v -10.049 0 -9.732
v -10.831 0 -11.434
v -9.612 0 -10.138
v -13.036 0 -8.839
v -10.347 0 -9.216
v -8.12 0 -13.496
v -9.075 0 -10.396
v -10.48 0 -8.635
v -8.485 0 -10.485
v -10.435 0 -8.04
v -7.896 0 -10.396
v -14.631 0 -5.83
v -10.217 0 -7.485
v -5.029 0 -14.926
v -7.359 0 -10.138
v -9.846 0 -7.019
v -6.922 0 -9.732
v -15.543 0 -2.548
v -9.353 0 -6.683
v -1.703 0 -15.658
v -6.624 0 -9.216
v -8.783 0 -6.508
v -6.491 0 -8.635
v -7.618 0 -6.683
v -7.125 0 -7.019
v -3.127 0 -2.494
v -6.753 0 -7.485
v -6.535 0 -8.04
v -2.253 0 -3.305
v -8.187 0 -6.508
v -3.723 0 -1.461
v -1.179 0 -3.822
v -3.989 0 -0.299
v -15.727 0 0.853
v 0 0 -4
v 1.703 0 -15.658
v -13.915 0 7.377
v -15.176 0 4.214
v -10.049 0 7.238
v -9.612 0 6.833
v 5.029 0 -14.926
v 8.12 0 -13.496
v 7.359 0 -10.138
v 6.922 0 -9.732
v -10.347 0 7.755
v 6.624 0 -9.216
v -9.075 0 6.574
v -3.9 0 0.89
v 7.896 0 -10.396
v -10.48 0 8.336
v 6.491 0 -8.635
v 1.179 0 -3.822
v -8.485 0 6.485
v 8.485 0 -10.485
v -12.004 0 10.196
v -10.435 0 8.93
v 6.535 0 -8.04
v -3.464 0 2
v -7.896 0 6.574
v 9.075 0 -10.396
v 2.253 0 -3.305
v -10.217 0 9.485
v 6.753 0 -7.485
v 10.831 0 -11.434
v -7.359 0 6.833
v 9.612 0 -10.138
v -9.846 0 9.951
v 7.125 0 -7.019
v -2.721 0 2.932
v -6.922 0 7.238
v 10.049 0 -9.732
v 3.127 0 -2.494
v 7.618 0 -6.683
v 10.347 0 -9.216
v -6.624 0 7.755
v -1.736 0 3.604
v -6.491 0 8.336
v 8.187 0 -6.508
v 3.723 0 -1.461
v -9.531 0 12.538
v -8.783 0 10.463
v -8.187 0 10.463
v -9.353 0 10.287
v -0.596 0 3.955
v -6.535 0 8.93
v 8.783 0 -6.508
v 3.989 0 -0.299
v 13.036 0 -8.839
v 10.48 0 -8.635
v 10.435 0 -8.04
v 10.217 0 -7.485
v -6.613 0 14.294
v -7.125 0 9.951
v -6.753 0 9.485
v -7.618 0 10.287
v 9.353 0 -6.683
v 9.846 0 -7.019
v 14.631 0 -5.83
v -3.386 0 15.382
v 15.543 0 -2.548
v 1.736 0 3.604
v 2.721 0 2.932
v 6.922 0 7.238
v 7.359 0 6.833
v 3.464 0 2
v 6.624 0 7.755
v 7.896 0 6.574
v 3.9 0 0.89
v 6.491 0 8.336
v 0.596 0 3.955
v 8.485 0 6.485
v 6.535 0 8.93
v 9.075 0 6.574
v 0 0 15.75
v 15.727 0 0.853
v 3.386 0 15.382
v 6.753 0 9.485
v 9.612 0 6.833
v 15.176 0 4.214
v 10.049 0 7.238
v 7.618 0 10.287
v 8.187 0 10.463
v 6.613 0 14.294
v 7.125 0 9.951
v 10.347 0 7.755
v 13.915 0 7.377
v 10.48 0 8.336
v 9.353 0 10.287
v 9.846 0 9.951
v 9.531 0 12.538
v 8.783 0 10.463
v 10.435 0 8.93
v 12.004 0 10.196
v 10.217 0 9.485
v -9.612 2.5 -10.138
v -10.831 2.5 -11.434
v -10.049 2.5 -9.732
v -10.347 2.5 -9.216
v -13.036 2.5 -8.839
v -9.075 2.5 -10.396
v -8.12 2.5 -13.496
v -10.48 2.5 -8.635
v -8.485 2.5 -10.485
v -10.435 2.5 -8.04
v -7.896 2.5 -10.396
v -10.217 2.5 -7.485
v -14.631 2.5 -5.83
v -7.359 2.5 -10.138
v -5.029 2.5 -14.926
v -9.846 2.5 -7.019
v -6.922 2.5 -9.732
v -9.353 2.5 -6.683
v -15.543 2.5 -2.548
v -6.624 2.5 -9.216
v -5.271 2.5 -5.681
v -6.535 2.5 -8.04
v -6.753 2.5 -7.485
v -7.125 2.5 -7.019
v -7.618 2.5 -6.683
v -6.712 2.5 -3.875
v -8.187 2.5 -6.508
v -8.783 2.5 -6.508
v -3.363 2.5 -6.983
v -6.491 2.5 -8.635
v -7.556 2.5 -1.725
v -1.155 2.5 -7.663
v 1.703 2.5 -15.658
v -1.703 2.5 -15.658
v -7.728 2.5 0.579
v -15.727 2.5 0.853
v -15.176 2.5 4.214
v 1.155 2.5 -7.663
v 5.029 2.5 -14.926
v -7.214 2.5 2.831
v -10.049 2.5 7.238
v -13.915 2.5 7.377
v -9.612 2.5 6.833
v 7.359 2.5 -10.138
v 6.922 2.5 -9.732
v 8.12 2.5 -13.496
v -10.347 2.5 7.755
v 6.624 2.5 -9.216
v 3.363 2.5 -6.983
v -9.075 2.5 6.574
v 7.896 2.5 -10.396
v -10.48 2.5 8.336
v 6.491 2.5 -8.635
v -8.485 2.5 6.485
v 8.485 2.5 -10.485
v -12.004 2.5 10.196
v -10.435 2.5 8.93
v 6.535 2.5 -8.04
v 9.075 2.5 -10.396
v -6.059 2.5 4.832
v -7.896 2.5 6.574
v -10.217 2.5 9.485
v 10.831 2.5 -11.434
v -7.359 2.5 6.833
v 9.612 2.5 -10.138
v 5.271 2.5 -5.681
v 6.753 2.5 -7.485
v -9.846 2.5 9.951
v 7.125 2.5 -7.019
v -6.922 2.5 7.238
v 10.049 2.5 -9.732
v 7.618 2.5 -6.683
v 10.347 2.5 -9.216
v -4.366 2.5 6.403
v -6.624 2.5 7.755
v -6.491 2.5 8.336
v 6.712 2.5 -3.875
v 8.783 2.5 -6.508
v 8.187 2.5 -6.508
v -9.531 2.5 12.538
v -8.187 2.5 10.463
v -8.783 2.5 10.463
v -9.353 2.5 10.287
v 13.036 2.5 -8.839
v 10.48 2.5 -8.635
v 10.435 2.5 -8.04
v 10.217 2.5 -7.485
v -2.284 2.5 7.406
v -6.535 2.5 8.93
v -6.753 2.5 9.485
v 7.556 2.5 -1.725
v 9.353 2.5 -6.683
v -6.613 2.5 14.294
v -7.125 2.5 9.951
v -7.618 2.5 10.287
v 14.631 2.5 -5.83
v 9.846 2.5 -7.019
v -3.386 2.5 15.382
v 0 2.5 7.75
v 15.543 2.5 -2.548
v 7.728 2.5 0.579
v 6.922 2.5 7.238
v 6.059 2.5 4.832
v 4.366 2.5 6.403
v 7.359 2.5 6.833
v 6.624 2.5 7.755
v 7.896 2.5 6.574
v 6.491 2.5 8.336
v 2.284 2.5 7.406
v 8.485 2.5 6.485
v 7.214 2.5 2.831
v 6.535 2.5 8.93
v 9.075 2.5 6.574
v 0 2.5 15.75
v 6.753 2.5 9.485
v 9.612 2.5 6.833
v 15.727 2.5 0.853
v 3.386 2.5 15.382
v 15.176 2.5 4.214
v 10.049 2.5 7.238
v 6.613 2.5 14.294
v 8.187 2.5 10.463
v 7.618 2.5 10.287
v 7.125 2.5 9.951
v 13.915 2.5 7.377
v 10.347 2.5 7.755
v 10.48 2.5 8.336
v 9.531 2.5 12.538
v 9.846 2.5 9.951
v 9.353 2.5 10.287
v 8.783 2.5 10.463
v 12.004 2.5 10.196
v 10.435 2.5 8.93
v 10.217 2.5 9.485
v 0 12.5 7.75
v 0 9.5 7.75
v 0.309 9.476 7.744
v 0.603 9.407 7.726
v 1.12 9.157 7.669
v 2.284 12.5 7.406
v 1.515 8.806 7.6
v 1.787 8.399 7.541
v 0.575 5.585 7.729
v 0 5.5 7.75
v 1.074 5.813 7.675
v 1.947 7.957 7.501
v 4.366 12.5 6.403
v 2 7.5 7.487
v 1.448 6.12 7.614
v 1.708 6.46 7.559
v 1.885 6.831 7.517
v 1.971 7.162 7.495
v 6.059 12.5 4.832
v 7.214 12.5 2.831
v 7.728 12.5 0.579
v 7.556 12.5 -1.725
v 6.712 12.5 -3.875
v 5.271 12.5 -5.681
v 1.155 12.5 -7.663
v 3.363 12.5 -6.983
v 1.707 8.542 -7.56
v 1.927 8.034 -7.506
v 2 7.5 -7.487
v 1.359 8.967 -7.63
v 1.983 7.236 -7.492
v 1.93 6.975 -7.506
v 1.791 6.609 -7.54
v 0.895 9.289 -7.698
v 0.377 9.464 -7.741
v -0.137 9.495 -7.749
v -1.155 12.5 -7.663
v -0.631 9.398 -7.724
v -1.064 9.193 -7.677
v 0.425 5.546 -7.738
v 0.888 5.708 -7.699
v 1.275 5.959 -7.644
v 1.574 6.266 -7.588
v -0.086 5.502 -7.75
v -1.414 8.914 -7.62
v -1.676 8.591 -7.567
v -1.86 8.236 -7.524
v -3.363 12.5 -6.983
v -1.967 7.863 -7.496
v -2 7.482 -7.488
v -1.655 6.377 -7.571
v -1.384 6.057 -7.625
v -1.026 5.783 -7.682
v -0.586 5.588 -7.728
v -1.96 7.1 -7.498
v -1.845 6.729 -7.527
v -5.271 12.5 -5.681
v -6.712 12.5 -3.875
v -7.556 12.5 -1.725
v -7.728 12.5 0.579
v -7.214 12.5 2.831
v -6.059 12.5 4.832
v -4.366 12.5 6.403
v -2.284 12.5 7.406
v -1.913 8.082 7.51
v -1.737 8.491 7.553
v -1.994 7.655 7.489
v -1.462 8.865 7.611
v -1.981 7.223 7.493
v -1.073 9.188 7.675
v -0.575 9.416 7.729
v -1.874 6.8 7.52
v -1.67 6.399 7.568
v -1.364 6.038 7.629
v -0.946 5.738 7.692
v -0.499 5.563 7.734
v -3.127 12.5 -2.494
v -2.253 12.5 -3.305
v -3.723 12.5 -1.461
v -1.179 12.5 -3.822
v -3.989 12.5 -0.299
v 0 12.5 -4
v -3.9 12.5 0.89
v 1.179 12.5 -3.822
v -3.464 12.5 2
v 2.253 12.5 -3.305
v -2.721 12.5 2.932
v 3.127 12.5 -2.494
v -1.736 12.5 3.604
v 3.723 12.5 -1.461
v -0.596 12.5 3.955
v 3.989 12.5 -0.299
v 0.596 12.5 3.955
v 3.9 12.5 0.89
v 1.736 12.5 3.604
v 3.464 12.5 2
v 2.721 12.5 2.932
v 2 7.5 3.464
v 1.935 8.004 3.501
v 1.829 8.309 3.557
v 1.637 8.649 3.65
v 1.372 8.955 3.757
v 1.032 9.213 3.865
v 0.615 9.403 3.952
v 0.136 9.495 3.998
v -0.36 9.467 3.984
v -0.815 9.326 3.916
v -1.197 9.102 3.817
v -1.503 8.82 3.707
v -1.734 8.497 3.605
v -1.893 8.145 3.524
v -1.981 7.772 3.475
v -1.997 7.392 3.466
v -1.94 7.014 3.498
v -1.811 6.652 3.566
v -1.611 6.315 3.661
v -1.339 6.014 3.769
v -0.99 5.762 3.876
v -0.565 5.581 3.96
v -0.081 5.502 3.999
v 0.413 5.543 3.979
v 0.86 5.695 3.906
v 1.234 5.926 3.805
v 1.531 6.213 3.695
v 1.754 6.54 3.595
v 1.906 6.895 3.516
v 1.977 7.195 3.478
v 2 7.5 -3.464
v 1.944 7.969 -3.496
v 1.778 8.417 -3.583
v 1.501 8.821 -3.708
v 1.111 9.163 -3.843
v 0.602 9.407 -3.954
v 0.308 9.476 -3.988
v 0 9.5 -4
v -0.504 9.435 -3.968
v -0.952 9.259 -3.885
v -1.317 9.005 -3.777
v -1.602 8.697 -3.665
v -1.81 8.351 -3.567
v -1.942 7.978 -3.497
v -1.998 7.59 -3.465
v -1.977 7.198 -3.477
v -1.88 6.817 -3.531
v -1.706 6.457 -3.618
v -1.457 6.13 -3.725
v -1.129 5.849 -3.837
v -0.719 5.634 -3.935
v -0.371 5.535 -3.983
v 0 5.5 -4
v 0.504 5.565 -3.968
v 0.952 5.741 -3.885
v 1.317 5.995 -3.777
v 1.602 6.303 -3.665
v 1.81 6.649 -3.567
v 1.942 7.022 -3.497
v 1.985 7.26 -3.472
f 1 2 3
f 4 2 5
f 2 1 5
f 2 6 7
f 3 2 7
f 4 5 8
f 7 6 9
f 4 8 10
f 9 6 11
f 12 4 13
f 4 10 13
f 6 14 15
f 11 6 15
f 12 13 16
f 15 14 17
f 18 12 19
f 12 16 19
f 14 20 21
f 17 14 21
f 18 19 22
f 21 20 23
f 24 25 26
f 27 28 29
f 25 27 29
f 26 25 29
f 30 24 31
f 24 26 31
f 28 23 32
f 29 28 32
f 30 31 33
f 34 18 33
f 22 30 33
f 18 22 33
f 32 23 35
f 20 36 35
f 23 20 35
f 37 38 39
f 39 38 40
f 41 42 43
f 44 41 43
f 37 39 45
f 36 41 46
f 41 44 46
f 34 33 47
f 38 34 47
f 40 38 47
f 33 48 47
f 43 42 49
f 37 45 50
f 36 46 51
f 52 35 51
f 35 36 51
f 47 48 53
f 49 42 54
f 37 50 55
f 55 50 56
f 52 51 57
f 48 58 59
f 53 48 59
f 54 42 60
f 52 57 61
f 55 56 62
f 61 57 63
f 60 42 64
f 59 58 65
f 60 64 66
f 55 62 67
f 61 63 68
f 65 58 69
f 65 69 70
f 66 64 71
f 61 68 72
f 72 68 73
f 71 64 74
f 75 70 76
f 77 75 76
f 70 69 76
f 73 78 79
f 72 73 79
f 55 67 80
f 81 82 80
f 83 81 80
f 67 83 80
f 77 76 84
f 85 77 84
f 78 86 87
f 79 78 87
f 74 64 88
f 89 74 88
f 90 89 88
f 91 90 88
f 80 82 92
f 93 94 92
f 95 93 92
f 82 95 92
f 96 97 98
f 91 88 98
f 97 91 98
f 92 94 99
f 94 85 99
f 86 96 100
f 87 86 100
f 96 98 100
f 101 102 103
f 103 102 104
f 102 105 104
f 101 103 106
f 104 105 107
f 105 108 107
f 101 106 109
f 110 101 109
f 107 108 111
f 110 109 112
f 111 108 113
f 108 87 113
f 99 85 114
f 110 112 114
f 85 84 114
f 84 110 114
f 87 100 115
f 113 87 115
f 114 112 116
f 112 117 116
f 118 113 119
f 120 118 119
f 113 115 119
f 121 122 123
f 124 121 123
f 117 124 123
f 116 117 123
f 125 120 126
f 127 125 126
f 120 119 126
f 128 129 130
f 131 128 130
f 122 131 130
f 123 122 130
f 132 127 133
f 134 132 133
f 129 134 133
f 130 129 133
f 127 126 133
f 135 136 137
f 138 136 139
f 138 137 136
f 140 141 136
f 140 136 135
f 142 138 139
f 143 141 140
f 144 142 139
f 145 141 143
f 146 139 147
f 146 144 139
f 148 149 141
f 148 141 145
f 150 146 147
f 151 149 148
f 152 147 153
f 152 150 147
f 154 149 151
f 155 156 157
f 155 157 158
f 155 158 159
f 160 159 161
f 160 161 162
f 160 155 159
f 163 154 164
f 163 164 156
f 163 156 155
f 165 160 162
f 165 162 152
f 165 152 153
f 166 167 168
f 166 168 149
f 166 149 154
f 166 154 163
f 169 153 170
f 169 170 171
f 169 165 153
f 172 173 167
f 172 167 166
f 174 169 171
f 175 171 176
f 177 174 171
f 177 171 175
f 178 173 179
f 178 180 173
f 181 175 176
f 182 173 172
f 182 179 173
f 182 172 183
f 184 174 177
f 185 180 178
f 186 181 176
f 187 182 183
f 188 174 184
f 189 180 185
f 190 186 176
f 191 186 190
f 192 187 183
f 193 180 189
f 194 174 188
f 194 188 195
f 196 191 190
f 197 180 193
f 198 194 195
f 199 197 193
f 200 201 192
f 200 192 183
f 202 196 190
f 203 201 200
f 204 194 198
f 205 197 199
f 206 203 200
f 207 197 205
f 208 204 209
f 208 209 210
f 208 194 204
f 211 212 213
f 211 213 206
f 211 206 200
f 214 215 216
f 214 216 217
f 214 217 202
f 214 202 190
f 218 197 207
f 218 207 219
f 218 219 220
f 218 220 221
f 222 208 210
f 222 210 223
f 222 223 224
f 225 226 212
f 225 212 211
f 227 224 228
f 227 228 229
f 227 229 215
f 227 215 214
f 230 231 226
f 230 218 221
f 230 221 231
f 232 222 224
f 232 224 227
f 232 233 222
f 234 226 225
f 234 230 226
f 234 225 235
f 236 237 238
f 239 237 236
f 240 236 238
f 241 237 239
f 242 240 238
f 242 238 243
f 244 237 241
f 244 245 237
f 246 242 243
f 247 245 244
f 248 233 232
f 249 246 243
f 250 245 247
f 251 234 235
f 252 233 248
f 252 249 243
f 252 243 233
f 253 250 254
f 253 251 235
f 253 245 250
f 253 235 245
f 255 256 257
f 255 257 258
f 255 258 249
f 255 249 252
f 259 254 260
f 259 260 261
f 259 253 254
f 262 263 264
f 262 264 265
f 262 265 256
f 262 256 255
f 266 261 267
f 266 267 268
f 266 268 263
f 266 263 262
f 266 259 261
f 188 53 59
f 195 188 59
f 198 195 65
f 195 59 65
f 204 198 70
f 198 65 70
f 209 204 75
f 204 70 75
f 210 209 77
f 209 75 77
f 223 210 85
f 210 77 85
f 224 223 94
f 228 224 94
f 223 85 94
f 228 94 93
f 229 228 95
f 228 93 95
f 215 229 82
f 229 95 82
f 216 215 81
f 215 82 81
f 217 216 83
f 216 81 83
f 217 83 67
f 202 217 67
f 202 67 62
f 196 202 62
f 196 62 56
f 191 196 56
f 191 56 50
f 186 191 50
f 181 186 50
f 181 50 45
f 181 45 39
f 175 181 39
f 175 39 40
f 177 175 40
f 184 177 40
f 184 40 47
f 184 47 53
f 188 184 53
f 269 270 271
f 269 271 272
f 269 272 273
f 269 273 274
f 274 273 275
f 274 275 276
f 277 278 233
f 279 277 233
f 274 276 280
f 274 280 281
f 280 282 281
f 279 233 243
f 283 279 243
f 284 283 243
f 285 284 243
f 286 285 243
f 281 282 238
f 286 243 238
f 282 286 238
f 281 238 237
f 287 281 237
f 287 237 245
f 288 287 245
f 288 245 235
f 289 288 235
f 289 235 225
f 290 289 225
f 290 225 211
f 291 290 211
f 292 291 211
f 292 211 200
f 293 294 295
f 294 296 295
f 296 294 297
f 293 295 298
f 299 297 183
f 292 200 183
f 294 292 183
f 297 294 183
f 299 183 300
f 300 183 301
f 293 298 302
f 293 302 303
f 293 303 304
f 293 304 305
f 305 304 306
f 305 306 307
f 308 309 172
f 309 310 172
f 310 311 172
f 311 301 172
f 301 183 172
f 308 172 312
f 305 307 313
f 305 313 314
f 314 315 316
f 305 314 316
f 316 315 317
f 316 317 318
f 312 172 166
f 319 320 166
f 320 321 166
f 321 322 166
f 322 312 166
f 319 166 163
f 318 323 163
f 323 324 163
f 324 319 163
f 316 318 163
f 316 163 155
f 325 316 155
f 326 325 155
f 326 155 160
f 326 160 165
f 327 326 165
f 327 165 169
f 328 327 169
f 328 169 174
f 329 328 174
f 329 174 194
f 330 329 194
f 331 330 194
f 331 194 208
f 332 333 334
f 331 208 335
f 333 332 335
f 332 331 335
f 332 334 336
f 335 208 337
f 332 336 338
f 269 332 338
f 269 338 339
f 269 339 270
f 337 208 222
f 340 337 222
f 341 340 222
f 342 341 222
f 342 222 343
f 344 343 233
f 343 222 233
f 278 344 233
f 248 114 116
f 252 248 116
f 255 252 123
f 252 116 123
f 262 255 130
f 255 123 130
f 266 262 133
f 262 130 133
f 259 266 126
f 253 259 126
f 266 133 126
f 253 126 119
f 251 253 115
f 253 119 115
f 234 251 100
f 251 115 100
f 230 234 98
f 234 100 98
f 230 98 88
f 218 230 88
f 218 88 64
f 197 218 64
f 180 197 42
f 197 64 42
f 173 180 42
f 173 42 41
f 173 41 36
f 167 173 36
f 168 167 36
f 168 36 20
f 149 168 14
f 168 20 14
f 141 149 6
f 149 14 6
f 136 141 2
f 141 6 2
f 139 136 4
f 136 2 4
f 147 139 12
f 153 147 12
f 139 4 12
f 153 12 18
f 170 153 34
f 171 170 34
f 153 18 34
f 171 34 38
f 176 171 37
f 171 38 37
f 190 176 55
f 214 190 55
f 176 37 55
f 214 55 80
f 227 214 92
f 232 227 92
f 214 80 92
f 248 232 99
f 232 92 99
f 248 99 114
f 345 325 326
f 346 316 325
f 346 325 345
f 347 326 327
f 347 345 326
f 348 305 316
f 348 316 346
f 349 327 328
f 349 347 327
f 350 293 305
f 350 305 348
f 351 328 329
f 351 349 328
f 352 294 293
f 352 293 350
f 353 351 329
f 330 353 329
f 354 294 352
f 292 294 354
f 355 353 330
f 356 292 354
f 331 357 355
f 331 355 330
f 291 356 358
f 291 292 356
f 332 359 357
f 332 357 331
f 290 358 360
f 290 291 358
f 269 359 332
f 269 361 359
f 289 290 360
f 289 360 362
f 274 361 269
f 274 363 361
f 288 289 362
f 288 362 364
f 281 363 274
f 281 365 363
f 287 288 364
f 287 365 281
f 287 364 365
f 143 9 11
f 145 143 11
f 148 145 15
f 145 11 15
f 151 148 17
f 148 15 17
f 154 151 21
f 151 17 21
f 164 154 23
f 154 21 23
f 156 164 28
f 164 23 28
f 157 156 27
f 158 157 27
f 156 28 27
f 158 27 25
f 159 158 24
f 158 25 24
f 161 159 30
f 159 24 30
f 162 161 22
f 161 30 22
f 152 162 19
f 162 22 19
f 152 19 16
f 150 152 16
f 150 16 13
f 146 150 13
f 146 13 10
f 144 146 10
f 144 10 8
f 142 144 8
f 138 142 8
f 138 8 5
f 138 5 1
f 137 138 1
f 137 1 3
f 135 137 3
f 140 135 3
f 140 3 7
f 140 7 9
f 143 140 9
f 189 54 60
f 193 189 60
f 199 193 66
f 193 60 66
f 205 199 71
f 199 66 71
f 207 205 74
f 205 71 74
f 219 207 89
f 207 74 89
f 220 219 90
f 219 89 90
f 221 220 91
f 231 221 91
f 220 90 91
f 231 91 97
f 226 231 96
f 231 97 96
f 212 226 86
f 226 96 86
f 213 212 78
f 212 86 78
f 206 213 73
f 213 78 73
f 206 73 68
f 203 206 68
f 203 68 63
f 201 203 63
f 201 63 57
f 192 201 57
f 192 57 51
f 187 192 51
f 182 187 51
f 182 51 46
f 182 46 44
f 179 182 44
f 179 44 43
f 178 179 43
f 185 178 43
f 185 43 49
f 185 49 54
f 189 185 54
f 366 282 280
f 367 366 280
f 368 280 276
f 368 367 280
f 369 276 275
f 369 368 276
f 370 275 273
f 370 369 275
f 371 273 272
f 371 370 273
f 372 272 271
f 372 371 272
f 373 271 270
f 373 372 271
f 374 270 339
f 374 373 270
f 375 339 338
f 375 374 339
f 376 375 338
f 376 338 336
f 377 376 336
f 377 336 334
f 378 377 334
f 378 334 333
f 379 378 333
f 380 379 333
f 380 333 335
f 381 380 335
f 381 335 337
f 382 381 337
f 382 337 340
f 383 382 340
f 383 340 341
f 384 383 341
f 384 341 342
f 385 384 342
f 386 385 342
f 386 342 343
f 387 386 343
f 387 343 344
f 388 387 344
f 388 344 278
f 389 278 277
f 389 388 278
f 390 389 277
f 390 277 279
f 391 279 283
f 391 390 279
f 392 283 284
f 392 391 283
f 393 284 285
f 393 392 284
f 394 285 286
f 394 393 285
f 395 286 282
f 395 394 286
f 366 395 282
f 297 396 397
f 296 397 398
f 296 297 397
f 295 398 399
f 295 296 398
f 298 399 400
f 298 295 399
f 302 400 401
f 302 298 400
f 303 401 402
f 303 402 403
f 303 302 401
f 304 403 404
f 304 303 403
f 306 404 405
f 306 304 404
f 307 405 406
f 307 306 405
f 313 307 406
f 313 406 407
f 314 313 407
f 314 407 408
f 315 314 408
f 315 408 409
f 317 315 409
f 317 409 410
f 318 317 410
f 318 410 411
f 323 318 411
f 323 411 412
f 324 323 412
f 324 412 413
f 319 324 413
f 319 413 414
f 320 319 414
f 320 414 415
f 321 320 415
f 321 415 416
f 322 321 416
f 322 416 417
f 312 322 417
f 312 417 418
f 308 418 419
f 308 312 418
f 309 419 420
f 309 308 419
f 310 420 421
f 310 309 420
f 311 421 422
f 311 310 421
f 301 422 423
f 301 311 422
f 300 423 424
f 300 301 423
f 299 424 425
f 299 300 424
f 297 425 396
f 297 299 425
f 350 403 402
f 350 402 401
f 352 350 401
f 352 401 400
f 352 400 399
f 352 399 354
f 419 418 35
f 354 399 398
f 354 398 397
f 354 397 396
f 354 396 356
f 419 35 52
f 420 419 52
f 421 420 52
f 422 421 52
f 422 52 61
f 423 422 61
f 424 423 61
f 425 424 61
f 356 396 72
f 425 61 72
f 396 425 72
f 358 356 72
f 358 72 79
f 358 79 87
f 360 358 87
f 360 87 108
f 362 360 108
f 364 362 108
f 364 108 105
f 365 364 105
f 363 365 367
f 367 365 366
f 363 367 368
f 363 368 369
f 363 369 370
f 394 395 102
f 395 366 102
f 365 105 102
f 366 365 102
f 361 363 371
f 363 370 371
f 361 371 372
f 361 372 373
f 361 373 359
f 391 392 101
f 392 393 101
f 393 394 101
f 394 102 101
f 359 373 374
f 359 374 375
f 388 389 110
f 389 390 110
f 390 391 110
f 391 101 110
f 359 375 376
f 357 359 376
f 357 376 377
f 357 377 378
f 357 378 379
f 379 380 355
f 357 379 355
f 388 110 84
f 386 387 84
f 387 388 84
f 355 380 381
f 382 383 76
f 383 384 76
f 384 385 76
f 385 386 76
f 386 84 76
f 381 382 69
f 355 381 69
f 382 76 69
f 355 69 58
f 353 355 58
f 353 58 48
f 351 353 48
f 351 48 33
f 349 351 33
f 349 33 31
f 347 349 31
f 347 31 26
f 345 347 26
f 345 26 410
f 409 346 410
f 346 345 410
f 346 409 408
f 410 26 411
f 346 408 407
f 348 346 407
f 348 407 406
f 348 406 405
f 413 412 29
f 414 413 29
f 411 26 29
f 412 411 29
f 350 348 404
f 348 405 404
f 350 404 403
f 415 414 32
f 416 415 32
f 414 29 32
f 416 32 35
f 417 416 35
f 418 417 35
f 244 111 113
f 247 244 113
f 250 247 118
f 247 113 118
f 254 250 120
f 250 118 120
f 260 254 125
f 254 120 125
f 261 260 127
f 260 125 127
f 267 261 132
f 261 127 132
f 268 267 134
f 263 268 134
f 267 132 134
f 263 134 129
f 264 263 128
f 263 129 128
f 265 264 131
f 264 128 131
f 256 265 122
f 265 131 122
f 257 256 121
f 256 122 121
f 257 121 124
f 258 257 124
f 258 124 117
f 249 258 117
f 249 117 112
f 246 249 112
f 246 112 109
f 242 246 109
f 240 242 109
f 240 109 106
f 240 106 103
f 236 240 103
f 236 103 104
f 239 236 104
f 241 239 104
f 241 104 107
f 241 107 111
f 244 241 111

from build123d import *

# Parameters (mm, degrees)
SKETCH1_R               = 15.75
BOSS_EXTRUDE1_DEPTH     = 2.5
SKETCH2_R               = 7.75
BOSS_EXTRUDE2_DEPTH     = 10
SKETCH3_R               = 4
CUT_EXTRUDE1_DEPTH      = 26.541632681
CUT_EXTRUDE2_DEPTH      = 26.541632681
CUT_EXTRUDE2_DEPTH_BACK = 26.541632681
SKETCH4_R               = 2
SKETCH5_R               = 2
CUT_EXTRUDE3_DEPTH      = 26.54163273


with BuildPart() as part:
    # Sketch1 → Boss-Extrude1 (new body)
    with BuildSketch(Plane(origin=(0, 0, 0), x_dir=(1, 0, 0), z_dir=(0, 1, 0))):
        with Locations(Location((0, 0, 0), (0, 0, 270))):
            Circle(SKETCH1_R)
    extrude(amount=BOSS_EXTRUDE1_DEPTH)

    # Sketch2 → Boss-Extrude2 (add)
    with BuildSketch(Plane(origin=(0, 2.5, 0), x_dir=(1, 0, 0), z_dir=(0, 1, 0))):
        with Locations(Location((0, 0, 0), (0, 0, 270))):
            Circle(SKETCH2_R)
    extrude(amount=BOSS_EXTRUDE2_DEPTH)

    # Sketch3 → Cut-Extrude1 (cut, through all)
    with BuildSketch(Plane.XZ):
        with Locations(Location((0, 0, 0), (0, 0, 270))):
            Circle(SKETCH3_R)
    extrude(amount=-CUT_EXTRUDE1_DEPTH, mode=Mode.SUBTRACT)

    # Sketch4 → Cut-Extrude2 (cut, two sides: drawn at the far end of the back side and taken through both)
    with BuildSketch(Plane.XY.offset(-CUT_EXTRUDE2_DEPTH_BACK)):
        with Locations((0, 7.5)):
            Circle(SKETCH4_R)
    extrude(amount=CUT_EXTRUDE2_DEPTH + CUT_EXTRUDE2_DEPTH_BACK, mode=Mode.SUBTRACT)

    # Sketch5 → Cut-Extrude3 (cut, through all)
    with BuildSketch(Plane.XZ):
        with Locations(Location((8.485281374, 8.485281374, 0), (0, 0, 270))):
            Circle(SKETCH5_R)
        with Locations(Location((8.485281374, -8.485281374, 0), (0, 0, 270))):
            Circle(SKETCH5_R)
        with Locations(Location((-8.485281374, -8.485281374, 0), (0, 0, 270))):
            Circle(SKETCH5_R)
        with Locations(Location((-8.485281374, 8.485281374, 0), (0, 0, 270))):
            Circle(SKETCH5_R)
    extrude(amount=-CUT_EXTRUDE3_DEPTH, mode=Mode.SUBTRACT)


solid = part.part
